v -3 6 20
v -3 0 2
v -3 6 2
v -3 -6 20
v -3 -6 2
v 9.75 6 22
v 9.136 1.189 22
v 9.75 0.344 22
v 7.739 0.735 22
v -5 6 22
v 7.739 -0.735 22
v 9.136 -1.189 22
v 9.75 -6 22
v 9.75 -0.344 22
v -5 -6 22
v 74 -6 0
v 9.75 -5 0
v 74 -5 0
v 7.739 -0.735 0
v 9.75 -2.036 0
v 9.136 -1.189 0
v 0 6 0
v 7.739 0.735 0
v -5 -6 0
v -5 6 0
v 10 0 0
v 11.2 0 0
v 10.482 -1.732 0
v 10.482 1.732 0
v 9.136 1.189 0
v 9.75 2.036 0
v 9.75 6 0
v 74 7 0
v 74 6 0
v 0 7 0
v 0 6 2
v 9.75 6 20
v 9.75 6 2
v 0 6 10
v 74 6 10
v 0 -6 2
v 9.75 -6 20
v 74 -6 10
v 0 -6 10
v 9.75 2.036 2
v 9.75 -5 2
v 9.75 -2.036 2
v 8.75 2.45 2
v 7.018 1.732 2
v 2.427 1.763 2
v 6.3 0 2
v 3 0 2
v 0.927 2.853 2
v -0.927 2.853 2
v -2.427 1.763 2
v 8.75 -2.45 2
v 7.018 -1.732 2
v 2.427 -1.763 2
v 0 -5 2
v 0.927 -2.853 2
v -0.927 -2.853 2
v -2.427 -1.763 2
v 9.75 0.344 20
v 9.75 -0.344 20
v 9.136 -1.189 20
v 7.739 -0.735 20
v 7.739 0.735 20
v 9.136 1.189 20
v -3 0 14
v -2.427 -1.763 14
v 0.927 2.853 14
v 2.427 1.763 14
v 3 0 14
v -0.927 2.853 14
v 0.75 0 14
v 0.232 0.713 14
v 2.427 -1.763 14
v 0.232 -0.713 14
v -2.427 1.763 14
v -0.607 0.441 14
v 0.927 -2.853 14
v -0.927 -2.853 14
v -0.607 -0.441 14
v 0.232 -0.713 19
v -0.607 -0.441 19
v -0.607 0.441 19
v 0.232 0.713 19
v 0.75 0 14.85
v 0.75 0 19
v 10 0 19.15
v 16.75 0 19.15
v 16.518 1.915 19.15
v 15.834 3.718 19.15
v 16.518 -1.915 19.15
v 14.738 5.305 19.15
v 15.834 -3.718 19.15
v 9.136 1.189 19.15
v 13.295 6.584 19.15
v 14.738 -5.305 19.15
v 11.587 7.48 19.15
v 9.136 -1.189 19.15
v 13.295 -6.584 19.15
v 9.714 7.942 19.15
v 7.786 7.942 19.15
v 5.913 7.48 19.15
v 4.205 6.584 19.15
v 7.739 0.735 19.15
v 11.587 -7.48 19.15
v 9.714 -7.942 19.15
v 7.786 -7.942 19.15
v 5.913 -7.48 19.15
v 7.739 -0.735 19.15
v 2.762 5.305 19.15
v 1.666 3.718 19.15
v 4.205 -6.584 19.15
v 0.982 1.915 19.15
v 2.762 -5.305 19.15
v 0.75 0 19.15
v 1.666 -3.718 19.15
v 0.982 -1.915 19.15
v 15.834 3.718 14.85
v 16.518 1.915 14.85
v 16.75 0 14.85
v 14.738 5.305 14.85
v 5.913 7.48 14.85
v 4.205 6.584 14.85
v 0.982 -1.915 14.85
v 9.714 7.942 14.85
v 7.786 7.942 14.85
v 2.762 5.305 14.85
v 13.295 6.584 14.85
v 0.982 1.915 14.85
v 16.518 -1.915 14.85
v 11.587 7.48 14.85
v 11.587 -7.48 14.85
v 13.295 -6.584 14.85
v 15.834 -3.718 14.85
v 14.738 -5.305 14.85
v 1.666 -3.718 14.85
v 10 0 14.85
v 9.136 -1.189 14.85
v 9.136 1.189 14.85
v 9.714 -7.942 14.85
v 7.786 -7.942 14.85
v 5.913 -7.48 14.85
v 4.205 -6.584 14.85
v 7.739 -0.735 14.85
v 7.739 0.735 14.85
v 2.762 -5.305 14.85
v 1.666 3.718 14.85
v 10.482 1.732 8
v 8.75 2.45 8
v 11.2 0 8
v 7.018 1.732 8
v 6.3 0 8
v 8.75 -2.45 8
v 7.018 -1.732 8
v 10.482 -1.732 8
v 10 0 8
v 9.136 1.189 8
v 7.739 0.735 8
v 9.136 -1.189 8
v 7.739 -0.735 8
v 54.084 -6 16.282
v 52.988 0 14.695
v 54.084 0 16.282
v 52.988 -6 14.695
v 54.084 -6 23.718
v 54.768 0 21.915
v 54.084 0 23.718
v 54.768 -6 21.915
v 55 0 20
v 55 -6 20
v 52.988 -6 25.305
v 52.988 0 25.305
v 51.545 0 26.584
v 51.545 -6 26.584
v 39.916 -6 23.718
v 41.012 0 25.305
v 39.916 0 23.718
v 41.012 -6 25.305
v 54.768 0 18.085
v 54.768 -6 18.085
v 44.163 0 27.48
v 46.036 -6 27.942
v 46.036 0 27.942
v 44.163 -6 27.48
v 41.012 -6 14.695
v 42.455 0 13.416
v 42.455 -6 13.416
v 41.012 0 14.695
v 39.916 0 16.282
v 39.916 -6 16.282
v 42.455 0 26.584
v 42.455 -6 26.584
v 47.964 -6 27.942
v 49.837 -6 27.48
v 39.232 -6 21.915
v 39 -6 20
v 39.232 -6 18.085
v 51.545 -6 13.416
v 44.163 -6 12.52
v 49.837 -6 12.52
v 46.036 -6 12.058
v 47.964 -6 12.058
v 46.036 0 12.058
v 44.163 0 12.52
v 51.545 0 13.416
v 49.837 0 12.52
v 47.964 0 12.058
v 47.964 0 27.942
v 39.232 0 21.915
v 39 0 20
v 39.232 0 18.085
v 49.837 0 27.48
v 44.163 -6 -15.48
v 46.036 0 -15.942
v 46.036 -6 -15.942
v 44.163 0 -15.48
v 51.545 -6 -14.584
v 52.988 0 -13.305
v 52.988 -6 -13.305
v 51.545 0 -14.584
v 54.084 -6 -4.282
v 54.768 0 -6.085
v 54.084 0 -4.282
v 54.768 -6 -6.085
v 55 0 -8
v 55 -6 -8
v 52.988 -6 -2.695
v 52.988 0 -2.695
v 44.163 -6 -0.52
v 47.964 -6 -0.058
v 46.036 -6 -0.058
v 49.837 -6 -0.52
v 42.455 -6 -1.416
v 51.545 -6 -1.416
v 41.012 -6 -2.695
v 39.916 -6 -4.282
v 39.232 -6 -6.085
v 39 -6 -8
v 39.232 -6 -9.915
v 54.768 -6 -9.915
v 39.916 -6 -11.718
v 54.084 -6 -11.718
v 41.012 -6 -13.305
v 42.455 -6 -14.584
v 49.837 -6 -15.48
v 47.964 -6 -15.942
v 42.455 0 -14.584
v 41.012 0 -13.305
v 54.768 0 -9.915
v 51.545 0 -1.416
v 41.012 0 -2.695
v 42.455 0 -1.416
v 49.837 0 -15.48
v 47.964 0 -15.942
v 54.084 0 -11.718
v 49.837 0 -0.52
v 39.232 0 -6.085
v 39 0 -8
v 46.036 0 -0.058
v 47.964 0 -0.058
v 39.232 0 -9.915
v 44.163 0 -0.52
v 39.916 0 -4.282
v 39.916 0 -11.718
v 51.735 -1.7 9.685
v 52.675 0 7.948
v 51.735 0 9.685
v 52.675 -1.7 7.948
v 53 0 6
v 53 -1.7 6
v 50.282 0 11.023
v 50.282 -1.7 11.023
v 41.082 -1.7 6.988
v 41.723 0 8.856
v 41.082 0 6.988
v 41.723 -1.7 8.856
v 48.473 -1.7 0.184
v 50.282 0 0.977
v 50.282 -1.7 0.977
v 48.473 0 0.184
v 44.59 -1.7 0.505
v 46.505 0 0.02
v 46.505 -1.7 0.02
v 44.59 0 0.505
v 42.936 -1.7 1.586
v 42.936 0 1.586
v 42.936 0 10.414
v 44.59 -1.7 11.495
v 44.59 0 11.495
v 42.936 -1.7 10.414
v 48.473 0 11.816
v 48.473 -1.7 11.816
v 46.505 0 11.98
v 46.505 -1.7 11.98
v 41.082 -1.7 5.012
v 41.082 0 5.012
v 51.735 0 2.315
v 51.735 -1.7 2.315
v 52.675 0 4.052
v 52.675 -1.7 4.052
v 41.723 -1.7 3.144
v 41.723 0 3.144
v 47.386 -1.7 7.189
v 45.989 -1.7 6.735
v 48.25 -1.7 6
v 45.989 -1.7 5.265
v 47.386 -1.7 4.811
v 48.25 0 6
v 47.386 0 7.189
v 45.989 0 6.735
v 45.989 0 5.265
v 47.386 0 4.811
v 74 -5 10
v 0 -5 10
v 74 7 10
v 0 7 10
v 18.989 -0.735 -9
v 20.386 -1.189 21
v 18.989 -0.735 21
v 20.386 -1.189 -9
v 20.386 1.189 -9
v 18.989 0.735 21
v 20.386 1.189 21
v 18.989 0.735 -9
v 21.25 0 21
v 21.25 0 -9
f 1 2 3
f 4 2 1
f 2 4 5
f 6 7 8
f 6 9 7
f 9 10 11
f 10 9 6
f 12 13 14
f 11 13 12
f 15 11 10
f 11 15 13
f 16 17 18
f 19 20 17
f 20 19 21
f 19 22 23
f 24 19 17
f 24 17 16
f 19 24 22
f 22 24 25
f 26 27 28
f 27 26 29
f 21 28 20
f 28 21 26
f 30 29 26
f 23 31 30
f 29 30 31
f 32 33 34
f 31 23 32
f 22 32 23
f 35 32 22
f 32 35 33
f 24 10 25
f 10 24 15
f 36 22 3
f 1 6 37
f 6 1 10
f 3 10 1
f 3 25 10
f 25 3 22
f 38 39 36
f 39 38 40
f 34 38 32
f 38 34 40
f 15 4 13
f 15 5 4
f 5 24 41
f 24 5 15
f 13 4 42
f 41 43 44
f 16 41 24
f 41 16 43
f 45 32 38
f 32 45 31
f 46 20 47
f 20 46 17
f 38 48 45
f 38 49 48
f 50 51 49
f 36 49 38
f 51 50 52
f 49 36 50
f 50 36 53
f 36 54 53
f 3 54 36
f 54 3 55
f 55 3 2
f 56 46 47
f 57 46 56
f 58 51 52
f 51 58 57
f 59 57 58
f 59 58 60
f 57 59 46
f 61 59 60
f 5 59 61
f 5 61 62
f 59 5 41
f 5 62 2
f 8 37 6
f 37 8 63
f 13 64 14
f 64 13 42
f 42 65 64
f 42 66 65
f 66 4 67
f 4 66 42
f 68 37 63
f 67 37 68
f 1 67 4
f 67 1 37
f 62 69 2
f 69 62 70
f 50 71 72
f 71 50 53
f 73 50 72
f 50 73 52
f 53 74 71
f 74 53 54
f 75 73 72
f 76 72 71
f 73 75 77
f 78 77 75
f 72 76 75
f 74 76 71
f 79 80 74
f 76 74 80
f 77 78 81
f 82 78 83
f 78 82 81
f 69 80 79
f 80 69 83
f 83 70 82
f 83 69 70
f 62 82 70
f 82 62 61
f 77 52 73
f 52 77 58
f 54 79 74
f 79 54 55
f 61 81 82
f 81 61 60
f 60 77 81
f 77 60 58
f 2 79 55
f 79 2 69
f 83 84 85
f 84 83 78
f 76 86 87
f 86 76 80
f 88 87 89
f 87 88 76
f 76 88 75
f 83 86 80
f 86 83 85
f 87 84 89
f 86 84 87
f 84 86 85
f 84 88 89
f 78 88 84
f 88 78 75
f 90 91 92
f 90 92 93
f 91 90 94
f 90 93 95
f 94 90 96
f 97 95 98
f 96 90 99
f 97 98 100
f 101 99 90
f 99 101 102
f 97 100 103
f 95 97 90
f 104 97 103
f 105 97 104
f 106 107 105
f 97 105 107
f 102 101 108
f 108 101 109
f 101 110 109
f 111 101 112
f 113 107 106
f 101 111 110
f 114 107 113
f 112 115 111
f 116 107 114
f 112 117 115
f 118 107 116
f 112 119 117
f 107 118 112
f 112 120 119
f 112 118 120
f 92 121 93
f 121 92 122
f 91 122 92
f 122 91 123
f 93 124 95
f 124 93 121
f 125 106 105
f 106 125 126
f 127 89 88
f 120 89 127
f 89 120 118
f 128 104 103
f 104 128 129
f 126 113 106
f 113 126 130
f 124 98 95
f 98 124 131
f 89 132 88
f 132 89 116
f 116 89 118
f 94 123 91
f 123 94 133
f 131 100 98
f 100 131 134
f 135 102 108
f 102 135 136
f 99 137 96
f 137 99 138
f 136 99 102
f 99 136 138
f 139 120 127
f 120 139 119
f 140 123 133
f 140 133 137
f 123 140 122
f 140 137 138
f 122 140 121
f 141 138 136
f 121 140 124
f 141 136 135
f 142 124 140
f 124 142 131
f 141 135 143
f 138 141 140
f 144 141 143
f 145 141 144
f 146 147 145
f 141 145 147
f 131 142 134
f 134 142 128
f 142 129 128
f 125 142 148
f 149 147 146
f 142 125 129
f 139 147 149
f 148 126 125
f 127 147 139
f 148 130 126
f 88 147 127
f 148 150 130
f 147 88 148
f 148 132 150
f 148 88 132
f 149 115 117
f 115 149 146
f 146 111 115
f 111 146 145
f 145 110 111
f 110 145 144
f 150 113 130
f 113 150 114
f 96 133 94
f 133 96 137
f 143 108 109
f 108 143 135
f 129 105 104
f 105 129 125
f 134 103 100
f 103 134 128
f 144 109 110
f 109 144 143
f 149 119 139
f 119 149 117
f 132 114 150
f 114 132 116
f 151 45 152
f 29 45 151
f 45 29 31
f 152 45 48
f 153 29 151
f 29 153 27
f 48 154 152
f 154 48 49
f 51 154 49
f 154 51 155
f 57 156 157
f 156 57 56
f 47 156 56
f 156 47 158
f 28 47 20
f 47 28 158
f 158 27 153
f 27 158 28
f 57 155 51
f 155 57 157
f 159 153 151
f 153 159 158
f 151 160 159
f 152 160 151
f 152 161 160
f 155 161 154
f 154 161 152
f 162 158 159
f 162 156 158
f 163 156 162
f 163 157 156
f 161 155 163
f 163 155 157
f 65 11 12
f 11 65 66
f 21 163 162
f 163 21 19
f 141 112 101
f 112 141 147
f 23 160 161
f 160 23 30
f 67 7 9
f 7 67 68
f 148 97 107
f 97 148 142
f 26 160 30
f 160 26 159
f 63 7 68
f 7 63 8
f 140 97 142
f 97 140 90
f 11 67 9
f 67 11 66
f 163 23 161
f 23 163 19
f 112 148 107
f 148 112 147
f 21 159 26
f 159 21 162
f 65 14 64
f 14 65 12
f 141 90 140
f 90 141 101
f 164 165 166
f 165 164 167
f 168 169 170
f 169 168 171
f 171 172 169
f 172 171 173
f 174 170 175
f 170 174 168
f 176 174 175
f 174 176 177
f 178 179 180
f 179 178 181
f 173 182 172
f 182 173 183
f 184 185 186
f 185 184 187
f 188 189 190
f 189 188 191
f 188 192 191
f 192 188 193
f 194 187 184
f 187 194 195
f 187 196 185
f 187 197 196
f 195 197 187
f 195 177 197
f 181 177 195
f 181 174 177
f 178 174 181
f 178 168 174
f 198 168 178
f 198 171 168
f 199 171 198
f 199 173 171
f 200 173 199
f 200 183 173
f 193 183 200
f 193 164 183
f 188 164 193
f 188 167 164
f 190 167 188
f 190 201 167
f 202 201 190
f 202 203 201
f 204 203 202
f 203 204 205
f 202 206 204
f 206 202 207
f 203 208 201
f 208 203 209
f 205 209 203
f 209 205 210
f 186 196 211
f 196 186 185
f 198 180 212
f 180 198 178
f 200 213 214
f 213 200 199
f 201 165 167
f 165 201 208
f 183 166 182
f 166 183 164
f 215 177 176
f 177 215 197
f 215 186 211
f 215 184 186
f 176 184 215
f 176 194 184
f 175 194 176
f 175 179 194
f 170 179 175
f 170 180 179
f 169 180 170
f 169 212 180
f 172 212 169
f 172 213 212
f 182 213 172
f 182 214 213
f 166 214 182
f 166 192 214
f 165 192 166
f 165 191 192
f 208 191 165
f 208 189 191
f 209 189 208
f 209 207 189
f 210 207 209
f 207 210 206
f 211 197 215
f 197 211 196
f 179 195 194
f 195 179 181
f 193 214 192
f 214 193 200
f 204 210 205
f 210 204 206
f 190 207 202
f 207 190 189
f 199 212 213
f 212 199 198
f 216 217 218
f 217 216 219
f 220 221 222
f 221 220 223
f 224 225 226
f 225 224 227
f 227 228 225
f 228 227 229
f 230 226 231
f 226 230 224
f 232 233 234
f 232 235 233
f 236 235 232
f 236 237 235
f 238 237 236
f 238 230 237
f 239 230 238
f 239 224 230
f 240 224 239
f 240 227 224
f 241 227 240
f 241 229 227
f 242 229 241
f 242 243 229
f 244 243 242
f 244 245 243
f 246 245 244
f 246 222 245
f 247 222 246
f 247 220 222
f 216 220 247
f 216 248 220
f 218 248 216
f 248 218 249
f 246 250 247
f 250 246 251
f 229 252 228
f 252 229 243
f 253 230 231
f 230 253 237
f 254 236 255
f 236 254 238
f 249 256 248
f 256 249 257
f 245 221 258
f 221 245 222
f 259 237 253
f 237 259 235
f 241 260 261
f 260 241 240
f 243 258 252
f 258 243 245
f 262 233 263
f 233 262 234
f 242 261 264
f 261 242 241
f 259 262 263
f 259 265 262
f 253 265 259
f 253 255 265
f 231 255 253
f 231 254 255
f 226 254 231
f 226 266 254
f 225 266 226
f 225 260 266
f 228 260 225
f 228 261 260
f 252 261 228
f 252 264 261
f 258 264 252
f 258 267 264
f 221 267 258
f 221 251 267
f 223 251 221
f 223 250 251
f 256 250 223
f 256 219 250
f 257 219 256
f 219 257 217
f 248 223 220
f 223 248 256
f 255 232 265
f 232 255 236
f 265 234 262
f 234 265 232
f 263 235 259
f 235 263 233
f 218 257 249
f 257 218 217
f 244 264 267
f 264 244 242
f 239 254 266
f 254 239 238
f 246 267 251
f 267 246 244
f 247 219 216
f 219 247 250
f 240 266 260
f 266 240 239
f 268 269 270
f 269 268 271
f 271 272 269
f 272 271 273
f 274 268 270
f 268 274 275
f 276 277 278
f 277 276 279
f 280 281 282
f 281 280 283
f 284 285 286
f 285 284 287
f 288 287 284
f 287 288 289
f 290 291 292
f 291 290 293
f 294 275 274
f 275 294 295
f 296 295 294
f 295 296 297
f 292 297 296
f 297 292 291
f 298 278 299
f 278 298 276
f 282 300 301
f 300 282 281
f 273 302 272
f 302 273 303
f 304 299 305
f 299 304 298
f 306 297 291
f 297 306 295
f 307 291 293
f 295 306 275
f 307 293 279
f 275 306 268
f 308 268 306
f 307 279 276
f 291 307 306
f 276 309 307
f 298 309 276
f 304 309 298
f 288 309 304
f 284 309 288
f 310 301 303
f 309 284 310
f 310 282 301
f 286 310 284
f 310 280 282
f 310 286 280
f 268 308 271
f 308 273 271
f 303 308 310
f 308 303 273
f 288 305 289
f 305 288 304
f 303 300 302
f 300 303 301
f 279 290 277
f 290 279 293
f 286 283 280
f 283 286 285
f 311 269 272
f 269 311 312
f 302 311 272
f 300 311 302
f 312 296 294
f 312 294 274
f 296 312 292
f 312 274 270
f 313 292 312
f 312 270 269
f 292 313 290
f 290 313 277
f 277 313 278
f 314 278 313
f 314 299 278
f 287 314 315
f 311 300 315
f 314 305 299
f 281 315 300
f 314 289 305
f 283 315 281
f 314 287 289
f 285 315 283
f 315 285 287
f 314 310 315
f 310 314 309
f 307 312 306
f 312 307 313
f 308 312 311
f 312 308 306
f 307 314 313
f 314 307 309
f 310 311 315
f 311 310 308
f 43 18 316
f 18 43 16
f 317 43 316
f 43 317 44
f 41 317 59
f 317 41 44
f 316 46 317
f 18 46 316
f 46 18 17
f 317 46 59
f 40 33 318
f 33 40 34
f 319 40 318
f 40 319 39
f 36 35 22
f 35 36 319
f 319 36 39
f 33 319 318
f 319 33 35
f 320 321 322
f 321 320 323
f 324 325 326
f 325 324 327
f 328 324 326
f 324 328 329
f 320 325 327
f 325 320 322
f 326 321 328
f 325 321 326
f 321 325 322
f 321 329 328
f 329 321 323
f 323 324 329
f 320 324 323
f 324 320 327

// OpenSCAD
// Dubs "A" class locomotive
//Measurements 1:64 scale in mm
//moved to github

lengthBetweenBuffers=74;
trackGauge=16.5;
frameThickness=1;
frameSideHeight=10;
axleDiameter=2.5;
frameOutsideSpacing=14;
frameInsideSpacing=frameOutsideSpacing-frameThickness*2;
frontAxleFromFrontDistance=20;
rearAxleFromFrontDistance=47;
axleHeight=6;
boilerCentreHeight=19;

motorLength= 14;
motorDiameter=6;
motorShaftLength=6;
motorShaftDiameter=1.5;

frictionWheelDiameter=16;
frictionWheelThickness=4.3;
frictionWheelORingID=12;
frictionWheelORingThickness=3;
frictionWheelX=frictionWheelDiameter/2+motorShaftDiameter/2;

driveShaftDiameter=2.5;


wormGearLength=8;
wormGearDiameter=4.9;

gearDiameter=12;
gearThickness=1.7;

motorMountThickness=2;
motorMountLength=motorLength+motorShaftLength+motorMountThickness;

motorMountDepth=frameInsideSpacing;
driveShaftLength=motorMountLength;

wheelRimOutsideDiameter=13;
wheelRimInsideDiameter=11;
wheelFlangeDiameter=16;
wheelNumberSpokes=14;
wheelSpokeThickness=1;
wheelTreadThickness=4;
wheelFlangeThickness=2;
wheelHubDiameter=5;


module frictionWheel() {
    cylinder(h=frictionWheelThickness,d=frictionWheelDiameter);
}

module motor() {
    color("red") cylinder(h=motorLength,d=motorDiameter);
    translate([0,0,motorLength/2+motorShaftLength]) cylinder(h=motorShaftLength,d=motorShaftDiameter);
}

module driveShaft() {
     color("yellow")  cylinder(h=driveShaftLength,d=driveShaftDiameter);
}

module wormGear() {
    color("white")  cylinder(h=wormGearLength,d=wormGearDiameter);
}

module gear() {
    color("white") cylinder(h=gearThickness,d=gearDiameter);
}

module wheel() {
    color("brown") cylinder(h=6,d=16);
}

module axle() {
    cylinder(h=30,d=axleDiameter,center=true);
}

module wheelAssembly() {
    rotate([90,0,0]) difference() {
        union() {
            translate([0,frameOutsideSpacing,0]) wheel();
            translate([0,-frameOutsideSpacing,0]) wheel();
            gear();
            
        }
        union() {
           axle();
        }
    }
}

module motorMount() {
    //top
    cube([motorMountThickness,motorMountDepth,motorMountLength]);
    //worm end
    cube([frictionWheelX+motorDiameter,motorMountDepth,motorMountThickness]);
    //friction Wheel end
    translate([0,0,motorMountLength-motorMountThickness]) cube([frictionWheelX+motorDiameter,motorMountDepth,motorMountThickness]);
}

module motorAssembly() {
   difference() {
       union() {
           translate([frictionWheelX,0,motorLength+motorShaftLength/2-frictionWheelThickness/2]) frictionWheel();

    translate([frictionWheelX,0,0]) wormGear();
    color("black") translate([-motorDiameter/2-motorMountThickness,-motorMountDepth/2,0]) motorMount();
    motor();
       }
       union() {
              translate([frictionWheelX,0,0]) driveShaft(); 
       }
   }
}

motorAssembly();

module frameSide() {
    cube([lengthBetweenBuffers,frameThickness,frameSideHeight]);
}



module frame() {
    difference() {
        union() {
            translate([0,-frameInsideSpacing/2,0]) frameSide();
            translate([0,frameInsideSpacing/2,0]) frameSide();
            translate([frontAxleFromFrontDistance,0,axleHeight]) axle();
            translate([rearAxleFromFrontDistance,0,axleHeight]) wheelAssembly();
        }
        union() {

        }
    }
}
    
    frame();
